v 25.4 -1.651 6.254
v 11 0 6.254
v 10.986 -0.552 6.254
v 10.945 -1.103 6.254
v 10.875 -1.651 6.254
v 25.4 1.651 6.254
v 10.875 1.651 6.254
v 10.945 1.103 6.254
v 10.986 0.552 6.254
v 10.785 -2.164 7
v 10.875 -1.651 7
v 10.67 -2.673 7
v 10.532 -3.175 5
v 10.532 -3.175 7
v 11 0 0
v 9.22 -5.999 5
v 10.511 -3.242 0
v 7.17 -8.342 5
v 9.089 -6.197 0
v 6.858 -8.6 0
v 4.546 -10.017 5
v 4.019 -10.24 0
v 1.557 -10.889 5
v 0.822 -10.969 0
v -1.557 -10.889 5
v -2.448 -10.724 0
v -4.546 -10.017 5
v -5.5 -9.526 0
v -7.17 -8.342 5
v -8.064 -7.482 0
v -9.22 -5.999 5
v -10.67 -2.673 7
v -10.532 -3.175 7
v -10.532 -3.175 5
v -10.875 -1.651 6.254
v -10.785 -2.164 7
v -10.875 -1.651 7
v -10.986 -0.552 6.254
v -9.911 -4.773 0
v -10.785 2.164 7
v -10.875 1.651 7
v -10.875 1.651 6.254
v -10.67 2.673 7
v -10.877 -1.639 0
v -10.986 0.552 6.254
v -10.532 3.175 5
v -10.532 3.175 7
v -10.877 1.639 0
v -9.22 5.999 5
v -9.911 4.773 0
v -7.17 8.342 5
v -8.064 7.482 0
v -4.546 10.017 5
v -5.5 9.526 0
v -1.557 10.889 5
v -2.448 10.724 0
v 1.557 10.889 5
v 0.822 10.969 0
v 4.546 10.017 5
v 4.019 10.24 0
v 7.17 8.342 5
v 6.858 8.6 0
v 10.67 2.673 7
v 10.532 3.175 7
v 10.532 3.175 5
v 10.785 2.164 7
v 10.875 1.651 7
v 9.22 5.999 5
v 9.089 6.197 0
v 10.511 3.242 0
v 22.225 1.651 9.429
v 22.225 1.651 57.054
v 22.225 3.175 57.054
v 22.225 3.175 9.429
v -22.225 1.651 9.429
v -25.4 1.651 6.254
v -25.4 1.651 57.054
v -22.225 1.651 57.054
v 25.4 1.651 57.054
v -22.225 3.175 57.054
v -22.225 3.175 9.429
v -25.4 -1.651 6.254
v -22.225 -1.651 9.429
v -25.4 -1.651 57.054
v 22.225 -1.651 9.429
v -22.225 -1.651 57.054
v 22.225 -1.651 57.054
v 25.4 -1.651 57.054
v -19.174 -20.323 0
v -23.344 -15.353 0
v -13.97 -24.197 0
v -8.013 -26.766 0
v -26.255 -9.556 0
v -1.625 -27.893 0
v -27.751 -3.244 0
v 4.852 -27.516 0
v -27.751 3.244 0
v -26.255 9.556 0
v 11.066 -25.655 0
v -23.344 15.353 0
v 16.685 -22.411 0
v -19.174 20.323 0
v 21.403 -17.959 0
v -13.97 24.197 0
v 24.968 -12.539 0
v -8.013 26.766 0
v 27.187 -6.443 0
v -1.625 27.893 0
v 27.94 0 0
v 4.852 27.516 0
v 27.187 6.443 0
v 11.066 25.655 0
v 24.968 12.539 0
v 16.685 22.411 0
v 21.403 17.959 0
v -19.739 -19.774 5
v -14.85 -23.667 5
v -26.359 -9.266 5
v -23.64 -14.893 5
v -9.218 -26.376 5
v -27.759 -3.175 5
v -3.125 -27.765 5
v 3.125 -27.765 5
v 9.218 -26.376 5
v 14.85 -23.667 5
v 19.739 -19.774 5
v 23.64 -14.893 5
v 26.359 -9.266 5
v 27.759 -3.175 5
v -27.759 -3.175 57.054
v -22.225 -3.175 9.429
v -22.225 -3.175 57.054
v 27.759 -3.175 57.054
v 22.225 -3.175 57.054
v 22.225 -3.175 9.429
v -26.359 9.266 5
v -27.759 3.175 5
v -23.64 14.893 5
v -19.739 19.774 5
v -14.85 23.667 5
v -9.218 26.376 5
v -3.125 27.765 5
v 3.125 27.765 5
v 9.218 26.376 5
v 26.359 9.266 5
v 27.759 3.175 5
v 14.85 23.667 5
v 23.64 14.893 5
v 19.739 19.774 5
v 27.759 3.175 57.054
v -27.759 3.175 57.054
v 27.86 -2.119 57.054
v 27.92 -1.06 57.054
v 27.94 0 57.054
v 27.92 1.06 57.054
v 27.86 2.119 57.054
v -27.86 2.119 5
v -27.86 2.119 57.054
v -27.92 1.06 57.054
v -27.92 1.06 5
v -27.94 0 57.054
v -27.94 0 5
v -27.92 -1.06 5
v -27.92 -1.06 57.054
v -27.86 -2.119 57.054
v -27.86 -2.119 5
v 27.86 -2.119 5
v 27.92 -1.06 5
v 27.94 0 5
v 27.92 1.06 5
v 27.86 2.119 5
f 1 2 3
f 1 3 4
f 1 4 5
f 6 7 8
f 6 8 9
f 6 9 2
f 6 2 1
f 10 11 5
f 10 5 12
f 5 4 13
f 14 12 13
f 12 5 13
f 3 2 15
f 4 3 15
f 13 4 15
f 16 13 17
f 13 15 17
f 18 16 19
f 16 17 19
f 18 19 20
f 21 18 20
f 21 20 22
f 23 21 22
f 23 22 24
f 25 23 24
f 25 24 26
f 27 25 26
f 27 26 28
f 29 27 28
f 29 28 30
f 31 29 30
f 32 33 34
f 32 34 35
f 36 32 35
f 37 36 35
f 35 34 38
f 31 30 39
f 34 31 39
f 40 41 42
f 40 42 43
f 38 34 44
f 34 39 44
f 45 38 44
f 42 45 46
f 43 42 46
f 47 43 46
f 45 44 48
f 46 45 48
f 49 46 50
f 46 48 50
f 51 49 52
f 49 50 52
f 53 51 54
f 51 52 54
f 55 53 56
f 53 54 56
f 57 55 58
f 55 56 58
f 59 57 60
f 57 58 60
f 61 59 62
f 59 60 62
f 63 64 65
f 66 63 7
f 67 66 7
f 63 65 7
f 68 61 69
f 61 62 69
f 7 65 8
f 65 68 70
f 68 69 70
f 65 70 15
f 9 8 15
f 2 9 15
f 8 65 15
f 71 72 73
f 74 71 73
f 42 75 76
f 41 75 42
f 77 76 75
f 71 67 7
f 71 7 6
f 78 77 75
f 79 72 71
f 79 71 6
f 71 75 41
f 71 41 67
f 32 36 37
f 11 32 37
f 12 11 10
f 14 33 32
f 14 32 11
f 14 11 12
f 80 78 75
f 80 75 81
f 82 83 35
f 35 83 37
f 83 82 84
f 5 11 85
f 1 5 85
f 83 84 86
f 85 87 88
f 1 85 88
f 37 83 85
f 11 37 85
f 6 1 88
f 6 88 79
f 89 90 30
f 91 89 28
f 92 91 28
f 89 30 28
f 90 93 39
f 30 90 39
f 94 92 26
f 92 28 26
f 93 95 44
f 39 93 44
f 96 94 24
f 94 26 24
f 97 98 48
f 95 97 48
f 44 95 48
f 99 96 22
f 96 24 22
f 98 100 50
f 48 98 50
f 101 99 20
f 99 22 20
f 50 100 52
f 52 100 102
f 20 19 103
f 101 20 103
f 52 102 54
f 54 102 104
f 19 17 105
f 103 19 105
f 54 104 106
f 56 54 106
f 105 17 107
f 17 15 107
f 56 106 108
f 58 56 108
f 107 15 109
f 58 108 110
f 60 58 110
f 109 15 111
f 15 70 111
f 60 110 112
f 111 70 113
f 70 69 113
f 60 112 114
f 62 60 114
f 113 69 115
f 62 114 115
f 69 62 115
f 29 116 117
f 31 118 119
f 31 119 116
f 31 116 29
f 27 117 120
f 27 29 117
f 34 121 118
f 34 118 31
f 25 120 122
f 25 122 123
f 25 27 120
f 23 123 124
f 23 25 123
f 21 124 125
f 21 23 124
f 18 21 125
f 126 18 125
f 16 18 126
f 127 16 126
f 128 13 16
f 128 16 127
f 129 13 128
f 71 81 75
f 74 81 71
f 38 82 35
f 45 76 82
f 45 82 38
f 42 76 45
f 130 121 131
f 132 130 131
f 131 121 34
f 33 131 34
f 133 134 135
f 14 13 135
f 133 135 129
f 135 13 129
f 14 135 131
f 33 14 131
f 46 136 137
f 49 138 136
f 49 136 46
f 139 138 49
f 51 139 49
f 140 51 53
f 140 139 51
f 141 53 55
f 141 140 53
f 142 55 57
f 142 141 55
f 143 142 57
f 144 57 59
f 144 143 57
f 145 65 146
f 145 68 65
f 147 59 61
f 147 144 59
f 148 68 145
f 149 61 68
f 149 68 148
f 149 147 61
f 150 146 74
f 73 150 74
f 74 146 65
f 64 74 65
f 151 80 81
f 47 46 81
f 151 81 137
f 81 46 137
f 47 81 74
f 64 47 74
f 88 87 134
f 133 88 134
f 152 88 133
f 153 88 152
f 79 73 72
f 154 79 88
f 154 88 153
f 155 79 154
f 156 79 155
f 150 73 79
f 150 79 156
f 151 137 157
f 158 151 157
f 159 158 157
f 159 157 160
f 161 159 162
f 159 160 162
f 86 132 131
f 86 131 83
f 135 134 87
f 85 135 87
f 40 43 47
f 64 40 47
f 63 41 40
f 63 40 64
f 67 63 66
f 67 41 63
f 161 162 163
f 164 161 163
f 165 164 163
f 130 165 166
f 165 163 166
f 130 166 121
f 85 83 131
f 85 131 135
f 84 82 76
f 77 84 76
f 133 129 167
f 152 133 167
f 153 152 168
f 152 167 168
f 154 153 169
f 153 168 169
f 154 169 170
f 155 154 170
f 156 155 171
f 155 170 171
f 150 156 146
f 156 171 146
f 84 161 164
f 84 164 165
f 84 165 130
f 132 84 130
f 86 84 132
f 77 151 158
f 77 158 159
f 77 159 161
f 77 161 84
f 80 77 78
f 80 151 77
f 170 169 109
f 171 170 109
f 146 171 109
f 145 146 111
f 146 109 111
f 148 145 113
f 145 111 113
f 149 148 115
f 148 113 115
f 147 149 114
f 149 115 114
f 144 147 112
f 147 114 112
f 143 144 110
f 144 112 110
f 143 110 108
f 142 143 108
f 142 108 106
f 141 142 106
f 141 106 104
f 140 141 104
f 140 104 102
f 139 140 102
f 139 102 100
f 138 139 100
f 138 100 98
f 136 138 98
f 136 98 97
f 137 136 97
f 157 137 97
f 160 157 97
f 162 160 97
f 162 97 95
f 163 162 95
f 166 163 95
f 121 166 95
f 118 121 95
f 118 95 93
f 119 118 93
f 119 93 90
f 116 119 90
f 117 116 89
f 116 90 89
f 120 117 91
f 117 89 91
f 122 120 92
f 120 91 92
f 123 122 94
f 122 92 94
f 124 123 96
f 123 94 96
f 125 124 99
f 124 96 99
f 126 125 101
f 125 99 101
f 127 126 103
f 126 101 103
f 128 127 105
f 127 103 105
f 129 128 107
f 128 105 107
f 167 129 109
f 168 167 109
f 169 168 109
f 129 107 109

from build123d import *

# Parameters (mm, degrees)
F0_R     = 27.94
F1_DEPTH = 5
F3_DEPTH = 52.054
F4_W     = 50.8
F4_H     = 3.302
F5_DEPTH = 50.8
F6_W     = 44.45
F6_H     = 6.35
F7_DEPTH = 47.625
F8_R     = 11
F9_DEPTH = 7


with BuildPart() as f1:
    # F0 (on Top) → F1 (new body)
    with BuildSketch(Plane.XY):
        Circle(F0_R)
    extrude(amount=F1_DEPTH)

    # F2 (on face) → F3 (join)
    with BuildSketch(Plane.XY.offset(5)):
        with BuildLine():
            ThreePointArc((27.94, 0), (27.8947173307, 1.5900770556), (27.7590161029, 3.175))
            Line((27.7590161029, 3.175), (-27.7590161029, 3.175))
            ThreePointArc((-27.7590161029, 3.175), (-27.8947173307, 1.5900770556), (-27.94, 0))
            ThreePointArc((-27.94, 0), (-27.8947173307, -1.5900770556), (-27.7590161029, -3.175))
            Line((-27.7590161029, -3.175), (27.7590161029, -3.175))
            ThreePointArc((27.7590161029, -3.175), (27.8947173307, -1.5900770556), (27.94, 0))
        make_face()
    extrude(amount=F3_DEPTH)

    # F4 (on face) → F5 (cut)
    with BuildSketch(Plane.XY.offset(57.054)):
        Rectangle(F4_W, F4_H)
    extrude(amount=-F5_DEPTH, mode=Mode.SUBTRACT)

    # F6 (on face) → F7 (cut)
    with BuildSketch(Plane.XY.offset(57.054)):
        Rectangle(F6_W, F6_H)
    extrude(amount=-F7_DEPTH, mode=Mode.SUBTRACT)

    # F8 (on face) → F9 (cut)
    with BuildSketch(Plane(origin=(0, 0, 0), x_dir=(1, 0, 0), z_dir=(0, 0, -1))):
        Circle(F8_R)
    extrude(amount=-F9_DEPTH, mode=Mode.SUBTRACT)


solid = f1.part
